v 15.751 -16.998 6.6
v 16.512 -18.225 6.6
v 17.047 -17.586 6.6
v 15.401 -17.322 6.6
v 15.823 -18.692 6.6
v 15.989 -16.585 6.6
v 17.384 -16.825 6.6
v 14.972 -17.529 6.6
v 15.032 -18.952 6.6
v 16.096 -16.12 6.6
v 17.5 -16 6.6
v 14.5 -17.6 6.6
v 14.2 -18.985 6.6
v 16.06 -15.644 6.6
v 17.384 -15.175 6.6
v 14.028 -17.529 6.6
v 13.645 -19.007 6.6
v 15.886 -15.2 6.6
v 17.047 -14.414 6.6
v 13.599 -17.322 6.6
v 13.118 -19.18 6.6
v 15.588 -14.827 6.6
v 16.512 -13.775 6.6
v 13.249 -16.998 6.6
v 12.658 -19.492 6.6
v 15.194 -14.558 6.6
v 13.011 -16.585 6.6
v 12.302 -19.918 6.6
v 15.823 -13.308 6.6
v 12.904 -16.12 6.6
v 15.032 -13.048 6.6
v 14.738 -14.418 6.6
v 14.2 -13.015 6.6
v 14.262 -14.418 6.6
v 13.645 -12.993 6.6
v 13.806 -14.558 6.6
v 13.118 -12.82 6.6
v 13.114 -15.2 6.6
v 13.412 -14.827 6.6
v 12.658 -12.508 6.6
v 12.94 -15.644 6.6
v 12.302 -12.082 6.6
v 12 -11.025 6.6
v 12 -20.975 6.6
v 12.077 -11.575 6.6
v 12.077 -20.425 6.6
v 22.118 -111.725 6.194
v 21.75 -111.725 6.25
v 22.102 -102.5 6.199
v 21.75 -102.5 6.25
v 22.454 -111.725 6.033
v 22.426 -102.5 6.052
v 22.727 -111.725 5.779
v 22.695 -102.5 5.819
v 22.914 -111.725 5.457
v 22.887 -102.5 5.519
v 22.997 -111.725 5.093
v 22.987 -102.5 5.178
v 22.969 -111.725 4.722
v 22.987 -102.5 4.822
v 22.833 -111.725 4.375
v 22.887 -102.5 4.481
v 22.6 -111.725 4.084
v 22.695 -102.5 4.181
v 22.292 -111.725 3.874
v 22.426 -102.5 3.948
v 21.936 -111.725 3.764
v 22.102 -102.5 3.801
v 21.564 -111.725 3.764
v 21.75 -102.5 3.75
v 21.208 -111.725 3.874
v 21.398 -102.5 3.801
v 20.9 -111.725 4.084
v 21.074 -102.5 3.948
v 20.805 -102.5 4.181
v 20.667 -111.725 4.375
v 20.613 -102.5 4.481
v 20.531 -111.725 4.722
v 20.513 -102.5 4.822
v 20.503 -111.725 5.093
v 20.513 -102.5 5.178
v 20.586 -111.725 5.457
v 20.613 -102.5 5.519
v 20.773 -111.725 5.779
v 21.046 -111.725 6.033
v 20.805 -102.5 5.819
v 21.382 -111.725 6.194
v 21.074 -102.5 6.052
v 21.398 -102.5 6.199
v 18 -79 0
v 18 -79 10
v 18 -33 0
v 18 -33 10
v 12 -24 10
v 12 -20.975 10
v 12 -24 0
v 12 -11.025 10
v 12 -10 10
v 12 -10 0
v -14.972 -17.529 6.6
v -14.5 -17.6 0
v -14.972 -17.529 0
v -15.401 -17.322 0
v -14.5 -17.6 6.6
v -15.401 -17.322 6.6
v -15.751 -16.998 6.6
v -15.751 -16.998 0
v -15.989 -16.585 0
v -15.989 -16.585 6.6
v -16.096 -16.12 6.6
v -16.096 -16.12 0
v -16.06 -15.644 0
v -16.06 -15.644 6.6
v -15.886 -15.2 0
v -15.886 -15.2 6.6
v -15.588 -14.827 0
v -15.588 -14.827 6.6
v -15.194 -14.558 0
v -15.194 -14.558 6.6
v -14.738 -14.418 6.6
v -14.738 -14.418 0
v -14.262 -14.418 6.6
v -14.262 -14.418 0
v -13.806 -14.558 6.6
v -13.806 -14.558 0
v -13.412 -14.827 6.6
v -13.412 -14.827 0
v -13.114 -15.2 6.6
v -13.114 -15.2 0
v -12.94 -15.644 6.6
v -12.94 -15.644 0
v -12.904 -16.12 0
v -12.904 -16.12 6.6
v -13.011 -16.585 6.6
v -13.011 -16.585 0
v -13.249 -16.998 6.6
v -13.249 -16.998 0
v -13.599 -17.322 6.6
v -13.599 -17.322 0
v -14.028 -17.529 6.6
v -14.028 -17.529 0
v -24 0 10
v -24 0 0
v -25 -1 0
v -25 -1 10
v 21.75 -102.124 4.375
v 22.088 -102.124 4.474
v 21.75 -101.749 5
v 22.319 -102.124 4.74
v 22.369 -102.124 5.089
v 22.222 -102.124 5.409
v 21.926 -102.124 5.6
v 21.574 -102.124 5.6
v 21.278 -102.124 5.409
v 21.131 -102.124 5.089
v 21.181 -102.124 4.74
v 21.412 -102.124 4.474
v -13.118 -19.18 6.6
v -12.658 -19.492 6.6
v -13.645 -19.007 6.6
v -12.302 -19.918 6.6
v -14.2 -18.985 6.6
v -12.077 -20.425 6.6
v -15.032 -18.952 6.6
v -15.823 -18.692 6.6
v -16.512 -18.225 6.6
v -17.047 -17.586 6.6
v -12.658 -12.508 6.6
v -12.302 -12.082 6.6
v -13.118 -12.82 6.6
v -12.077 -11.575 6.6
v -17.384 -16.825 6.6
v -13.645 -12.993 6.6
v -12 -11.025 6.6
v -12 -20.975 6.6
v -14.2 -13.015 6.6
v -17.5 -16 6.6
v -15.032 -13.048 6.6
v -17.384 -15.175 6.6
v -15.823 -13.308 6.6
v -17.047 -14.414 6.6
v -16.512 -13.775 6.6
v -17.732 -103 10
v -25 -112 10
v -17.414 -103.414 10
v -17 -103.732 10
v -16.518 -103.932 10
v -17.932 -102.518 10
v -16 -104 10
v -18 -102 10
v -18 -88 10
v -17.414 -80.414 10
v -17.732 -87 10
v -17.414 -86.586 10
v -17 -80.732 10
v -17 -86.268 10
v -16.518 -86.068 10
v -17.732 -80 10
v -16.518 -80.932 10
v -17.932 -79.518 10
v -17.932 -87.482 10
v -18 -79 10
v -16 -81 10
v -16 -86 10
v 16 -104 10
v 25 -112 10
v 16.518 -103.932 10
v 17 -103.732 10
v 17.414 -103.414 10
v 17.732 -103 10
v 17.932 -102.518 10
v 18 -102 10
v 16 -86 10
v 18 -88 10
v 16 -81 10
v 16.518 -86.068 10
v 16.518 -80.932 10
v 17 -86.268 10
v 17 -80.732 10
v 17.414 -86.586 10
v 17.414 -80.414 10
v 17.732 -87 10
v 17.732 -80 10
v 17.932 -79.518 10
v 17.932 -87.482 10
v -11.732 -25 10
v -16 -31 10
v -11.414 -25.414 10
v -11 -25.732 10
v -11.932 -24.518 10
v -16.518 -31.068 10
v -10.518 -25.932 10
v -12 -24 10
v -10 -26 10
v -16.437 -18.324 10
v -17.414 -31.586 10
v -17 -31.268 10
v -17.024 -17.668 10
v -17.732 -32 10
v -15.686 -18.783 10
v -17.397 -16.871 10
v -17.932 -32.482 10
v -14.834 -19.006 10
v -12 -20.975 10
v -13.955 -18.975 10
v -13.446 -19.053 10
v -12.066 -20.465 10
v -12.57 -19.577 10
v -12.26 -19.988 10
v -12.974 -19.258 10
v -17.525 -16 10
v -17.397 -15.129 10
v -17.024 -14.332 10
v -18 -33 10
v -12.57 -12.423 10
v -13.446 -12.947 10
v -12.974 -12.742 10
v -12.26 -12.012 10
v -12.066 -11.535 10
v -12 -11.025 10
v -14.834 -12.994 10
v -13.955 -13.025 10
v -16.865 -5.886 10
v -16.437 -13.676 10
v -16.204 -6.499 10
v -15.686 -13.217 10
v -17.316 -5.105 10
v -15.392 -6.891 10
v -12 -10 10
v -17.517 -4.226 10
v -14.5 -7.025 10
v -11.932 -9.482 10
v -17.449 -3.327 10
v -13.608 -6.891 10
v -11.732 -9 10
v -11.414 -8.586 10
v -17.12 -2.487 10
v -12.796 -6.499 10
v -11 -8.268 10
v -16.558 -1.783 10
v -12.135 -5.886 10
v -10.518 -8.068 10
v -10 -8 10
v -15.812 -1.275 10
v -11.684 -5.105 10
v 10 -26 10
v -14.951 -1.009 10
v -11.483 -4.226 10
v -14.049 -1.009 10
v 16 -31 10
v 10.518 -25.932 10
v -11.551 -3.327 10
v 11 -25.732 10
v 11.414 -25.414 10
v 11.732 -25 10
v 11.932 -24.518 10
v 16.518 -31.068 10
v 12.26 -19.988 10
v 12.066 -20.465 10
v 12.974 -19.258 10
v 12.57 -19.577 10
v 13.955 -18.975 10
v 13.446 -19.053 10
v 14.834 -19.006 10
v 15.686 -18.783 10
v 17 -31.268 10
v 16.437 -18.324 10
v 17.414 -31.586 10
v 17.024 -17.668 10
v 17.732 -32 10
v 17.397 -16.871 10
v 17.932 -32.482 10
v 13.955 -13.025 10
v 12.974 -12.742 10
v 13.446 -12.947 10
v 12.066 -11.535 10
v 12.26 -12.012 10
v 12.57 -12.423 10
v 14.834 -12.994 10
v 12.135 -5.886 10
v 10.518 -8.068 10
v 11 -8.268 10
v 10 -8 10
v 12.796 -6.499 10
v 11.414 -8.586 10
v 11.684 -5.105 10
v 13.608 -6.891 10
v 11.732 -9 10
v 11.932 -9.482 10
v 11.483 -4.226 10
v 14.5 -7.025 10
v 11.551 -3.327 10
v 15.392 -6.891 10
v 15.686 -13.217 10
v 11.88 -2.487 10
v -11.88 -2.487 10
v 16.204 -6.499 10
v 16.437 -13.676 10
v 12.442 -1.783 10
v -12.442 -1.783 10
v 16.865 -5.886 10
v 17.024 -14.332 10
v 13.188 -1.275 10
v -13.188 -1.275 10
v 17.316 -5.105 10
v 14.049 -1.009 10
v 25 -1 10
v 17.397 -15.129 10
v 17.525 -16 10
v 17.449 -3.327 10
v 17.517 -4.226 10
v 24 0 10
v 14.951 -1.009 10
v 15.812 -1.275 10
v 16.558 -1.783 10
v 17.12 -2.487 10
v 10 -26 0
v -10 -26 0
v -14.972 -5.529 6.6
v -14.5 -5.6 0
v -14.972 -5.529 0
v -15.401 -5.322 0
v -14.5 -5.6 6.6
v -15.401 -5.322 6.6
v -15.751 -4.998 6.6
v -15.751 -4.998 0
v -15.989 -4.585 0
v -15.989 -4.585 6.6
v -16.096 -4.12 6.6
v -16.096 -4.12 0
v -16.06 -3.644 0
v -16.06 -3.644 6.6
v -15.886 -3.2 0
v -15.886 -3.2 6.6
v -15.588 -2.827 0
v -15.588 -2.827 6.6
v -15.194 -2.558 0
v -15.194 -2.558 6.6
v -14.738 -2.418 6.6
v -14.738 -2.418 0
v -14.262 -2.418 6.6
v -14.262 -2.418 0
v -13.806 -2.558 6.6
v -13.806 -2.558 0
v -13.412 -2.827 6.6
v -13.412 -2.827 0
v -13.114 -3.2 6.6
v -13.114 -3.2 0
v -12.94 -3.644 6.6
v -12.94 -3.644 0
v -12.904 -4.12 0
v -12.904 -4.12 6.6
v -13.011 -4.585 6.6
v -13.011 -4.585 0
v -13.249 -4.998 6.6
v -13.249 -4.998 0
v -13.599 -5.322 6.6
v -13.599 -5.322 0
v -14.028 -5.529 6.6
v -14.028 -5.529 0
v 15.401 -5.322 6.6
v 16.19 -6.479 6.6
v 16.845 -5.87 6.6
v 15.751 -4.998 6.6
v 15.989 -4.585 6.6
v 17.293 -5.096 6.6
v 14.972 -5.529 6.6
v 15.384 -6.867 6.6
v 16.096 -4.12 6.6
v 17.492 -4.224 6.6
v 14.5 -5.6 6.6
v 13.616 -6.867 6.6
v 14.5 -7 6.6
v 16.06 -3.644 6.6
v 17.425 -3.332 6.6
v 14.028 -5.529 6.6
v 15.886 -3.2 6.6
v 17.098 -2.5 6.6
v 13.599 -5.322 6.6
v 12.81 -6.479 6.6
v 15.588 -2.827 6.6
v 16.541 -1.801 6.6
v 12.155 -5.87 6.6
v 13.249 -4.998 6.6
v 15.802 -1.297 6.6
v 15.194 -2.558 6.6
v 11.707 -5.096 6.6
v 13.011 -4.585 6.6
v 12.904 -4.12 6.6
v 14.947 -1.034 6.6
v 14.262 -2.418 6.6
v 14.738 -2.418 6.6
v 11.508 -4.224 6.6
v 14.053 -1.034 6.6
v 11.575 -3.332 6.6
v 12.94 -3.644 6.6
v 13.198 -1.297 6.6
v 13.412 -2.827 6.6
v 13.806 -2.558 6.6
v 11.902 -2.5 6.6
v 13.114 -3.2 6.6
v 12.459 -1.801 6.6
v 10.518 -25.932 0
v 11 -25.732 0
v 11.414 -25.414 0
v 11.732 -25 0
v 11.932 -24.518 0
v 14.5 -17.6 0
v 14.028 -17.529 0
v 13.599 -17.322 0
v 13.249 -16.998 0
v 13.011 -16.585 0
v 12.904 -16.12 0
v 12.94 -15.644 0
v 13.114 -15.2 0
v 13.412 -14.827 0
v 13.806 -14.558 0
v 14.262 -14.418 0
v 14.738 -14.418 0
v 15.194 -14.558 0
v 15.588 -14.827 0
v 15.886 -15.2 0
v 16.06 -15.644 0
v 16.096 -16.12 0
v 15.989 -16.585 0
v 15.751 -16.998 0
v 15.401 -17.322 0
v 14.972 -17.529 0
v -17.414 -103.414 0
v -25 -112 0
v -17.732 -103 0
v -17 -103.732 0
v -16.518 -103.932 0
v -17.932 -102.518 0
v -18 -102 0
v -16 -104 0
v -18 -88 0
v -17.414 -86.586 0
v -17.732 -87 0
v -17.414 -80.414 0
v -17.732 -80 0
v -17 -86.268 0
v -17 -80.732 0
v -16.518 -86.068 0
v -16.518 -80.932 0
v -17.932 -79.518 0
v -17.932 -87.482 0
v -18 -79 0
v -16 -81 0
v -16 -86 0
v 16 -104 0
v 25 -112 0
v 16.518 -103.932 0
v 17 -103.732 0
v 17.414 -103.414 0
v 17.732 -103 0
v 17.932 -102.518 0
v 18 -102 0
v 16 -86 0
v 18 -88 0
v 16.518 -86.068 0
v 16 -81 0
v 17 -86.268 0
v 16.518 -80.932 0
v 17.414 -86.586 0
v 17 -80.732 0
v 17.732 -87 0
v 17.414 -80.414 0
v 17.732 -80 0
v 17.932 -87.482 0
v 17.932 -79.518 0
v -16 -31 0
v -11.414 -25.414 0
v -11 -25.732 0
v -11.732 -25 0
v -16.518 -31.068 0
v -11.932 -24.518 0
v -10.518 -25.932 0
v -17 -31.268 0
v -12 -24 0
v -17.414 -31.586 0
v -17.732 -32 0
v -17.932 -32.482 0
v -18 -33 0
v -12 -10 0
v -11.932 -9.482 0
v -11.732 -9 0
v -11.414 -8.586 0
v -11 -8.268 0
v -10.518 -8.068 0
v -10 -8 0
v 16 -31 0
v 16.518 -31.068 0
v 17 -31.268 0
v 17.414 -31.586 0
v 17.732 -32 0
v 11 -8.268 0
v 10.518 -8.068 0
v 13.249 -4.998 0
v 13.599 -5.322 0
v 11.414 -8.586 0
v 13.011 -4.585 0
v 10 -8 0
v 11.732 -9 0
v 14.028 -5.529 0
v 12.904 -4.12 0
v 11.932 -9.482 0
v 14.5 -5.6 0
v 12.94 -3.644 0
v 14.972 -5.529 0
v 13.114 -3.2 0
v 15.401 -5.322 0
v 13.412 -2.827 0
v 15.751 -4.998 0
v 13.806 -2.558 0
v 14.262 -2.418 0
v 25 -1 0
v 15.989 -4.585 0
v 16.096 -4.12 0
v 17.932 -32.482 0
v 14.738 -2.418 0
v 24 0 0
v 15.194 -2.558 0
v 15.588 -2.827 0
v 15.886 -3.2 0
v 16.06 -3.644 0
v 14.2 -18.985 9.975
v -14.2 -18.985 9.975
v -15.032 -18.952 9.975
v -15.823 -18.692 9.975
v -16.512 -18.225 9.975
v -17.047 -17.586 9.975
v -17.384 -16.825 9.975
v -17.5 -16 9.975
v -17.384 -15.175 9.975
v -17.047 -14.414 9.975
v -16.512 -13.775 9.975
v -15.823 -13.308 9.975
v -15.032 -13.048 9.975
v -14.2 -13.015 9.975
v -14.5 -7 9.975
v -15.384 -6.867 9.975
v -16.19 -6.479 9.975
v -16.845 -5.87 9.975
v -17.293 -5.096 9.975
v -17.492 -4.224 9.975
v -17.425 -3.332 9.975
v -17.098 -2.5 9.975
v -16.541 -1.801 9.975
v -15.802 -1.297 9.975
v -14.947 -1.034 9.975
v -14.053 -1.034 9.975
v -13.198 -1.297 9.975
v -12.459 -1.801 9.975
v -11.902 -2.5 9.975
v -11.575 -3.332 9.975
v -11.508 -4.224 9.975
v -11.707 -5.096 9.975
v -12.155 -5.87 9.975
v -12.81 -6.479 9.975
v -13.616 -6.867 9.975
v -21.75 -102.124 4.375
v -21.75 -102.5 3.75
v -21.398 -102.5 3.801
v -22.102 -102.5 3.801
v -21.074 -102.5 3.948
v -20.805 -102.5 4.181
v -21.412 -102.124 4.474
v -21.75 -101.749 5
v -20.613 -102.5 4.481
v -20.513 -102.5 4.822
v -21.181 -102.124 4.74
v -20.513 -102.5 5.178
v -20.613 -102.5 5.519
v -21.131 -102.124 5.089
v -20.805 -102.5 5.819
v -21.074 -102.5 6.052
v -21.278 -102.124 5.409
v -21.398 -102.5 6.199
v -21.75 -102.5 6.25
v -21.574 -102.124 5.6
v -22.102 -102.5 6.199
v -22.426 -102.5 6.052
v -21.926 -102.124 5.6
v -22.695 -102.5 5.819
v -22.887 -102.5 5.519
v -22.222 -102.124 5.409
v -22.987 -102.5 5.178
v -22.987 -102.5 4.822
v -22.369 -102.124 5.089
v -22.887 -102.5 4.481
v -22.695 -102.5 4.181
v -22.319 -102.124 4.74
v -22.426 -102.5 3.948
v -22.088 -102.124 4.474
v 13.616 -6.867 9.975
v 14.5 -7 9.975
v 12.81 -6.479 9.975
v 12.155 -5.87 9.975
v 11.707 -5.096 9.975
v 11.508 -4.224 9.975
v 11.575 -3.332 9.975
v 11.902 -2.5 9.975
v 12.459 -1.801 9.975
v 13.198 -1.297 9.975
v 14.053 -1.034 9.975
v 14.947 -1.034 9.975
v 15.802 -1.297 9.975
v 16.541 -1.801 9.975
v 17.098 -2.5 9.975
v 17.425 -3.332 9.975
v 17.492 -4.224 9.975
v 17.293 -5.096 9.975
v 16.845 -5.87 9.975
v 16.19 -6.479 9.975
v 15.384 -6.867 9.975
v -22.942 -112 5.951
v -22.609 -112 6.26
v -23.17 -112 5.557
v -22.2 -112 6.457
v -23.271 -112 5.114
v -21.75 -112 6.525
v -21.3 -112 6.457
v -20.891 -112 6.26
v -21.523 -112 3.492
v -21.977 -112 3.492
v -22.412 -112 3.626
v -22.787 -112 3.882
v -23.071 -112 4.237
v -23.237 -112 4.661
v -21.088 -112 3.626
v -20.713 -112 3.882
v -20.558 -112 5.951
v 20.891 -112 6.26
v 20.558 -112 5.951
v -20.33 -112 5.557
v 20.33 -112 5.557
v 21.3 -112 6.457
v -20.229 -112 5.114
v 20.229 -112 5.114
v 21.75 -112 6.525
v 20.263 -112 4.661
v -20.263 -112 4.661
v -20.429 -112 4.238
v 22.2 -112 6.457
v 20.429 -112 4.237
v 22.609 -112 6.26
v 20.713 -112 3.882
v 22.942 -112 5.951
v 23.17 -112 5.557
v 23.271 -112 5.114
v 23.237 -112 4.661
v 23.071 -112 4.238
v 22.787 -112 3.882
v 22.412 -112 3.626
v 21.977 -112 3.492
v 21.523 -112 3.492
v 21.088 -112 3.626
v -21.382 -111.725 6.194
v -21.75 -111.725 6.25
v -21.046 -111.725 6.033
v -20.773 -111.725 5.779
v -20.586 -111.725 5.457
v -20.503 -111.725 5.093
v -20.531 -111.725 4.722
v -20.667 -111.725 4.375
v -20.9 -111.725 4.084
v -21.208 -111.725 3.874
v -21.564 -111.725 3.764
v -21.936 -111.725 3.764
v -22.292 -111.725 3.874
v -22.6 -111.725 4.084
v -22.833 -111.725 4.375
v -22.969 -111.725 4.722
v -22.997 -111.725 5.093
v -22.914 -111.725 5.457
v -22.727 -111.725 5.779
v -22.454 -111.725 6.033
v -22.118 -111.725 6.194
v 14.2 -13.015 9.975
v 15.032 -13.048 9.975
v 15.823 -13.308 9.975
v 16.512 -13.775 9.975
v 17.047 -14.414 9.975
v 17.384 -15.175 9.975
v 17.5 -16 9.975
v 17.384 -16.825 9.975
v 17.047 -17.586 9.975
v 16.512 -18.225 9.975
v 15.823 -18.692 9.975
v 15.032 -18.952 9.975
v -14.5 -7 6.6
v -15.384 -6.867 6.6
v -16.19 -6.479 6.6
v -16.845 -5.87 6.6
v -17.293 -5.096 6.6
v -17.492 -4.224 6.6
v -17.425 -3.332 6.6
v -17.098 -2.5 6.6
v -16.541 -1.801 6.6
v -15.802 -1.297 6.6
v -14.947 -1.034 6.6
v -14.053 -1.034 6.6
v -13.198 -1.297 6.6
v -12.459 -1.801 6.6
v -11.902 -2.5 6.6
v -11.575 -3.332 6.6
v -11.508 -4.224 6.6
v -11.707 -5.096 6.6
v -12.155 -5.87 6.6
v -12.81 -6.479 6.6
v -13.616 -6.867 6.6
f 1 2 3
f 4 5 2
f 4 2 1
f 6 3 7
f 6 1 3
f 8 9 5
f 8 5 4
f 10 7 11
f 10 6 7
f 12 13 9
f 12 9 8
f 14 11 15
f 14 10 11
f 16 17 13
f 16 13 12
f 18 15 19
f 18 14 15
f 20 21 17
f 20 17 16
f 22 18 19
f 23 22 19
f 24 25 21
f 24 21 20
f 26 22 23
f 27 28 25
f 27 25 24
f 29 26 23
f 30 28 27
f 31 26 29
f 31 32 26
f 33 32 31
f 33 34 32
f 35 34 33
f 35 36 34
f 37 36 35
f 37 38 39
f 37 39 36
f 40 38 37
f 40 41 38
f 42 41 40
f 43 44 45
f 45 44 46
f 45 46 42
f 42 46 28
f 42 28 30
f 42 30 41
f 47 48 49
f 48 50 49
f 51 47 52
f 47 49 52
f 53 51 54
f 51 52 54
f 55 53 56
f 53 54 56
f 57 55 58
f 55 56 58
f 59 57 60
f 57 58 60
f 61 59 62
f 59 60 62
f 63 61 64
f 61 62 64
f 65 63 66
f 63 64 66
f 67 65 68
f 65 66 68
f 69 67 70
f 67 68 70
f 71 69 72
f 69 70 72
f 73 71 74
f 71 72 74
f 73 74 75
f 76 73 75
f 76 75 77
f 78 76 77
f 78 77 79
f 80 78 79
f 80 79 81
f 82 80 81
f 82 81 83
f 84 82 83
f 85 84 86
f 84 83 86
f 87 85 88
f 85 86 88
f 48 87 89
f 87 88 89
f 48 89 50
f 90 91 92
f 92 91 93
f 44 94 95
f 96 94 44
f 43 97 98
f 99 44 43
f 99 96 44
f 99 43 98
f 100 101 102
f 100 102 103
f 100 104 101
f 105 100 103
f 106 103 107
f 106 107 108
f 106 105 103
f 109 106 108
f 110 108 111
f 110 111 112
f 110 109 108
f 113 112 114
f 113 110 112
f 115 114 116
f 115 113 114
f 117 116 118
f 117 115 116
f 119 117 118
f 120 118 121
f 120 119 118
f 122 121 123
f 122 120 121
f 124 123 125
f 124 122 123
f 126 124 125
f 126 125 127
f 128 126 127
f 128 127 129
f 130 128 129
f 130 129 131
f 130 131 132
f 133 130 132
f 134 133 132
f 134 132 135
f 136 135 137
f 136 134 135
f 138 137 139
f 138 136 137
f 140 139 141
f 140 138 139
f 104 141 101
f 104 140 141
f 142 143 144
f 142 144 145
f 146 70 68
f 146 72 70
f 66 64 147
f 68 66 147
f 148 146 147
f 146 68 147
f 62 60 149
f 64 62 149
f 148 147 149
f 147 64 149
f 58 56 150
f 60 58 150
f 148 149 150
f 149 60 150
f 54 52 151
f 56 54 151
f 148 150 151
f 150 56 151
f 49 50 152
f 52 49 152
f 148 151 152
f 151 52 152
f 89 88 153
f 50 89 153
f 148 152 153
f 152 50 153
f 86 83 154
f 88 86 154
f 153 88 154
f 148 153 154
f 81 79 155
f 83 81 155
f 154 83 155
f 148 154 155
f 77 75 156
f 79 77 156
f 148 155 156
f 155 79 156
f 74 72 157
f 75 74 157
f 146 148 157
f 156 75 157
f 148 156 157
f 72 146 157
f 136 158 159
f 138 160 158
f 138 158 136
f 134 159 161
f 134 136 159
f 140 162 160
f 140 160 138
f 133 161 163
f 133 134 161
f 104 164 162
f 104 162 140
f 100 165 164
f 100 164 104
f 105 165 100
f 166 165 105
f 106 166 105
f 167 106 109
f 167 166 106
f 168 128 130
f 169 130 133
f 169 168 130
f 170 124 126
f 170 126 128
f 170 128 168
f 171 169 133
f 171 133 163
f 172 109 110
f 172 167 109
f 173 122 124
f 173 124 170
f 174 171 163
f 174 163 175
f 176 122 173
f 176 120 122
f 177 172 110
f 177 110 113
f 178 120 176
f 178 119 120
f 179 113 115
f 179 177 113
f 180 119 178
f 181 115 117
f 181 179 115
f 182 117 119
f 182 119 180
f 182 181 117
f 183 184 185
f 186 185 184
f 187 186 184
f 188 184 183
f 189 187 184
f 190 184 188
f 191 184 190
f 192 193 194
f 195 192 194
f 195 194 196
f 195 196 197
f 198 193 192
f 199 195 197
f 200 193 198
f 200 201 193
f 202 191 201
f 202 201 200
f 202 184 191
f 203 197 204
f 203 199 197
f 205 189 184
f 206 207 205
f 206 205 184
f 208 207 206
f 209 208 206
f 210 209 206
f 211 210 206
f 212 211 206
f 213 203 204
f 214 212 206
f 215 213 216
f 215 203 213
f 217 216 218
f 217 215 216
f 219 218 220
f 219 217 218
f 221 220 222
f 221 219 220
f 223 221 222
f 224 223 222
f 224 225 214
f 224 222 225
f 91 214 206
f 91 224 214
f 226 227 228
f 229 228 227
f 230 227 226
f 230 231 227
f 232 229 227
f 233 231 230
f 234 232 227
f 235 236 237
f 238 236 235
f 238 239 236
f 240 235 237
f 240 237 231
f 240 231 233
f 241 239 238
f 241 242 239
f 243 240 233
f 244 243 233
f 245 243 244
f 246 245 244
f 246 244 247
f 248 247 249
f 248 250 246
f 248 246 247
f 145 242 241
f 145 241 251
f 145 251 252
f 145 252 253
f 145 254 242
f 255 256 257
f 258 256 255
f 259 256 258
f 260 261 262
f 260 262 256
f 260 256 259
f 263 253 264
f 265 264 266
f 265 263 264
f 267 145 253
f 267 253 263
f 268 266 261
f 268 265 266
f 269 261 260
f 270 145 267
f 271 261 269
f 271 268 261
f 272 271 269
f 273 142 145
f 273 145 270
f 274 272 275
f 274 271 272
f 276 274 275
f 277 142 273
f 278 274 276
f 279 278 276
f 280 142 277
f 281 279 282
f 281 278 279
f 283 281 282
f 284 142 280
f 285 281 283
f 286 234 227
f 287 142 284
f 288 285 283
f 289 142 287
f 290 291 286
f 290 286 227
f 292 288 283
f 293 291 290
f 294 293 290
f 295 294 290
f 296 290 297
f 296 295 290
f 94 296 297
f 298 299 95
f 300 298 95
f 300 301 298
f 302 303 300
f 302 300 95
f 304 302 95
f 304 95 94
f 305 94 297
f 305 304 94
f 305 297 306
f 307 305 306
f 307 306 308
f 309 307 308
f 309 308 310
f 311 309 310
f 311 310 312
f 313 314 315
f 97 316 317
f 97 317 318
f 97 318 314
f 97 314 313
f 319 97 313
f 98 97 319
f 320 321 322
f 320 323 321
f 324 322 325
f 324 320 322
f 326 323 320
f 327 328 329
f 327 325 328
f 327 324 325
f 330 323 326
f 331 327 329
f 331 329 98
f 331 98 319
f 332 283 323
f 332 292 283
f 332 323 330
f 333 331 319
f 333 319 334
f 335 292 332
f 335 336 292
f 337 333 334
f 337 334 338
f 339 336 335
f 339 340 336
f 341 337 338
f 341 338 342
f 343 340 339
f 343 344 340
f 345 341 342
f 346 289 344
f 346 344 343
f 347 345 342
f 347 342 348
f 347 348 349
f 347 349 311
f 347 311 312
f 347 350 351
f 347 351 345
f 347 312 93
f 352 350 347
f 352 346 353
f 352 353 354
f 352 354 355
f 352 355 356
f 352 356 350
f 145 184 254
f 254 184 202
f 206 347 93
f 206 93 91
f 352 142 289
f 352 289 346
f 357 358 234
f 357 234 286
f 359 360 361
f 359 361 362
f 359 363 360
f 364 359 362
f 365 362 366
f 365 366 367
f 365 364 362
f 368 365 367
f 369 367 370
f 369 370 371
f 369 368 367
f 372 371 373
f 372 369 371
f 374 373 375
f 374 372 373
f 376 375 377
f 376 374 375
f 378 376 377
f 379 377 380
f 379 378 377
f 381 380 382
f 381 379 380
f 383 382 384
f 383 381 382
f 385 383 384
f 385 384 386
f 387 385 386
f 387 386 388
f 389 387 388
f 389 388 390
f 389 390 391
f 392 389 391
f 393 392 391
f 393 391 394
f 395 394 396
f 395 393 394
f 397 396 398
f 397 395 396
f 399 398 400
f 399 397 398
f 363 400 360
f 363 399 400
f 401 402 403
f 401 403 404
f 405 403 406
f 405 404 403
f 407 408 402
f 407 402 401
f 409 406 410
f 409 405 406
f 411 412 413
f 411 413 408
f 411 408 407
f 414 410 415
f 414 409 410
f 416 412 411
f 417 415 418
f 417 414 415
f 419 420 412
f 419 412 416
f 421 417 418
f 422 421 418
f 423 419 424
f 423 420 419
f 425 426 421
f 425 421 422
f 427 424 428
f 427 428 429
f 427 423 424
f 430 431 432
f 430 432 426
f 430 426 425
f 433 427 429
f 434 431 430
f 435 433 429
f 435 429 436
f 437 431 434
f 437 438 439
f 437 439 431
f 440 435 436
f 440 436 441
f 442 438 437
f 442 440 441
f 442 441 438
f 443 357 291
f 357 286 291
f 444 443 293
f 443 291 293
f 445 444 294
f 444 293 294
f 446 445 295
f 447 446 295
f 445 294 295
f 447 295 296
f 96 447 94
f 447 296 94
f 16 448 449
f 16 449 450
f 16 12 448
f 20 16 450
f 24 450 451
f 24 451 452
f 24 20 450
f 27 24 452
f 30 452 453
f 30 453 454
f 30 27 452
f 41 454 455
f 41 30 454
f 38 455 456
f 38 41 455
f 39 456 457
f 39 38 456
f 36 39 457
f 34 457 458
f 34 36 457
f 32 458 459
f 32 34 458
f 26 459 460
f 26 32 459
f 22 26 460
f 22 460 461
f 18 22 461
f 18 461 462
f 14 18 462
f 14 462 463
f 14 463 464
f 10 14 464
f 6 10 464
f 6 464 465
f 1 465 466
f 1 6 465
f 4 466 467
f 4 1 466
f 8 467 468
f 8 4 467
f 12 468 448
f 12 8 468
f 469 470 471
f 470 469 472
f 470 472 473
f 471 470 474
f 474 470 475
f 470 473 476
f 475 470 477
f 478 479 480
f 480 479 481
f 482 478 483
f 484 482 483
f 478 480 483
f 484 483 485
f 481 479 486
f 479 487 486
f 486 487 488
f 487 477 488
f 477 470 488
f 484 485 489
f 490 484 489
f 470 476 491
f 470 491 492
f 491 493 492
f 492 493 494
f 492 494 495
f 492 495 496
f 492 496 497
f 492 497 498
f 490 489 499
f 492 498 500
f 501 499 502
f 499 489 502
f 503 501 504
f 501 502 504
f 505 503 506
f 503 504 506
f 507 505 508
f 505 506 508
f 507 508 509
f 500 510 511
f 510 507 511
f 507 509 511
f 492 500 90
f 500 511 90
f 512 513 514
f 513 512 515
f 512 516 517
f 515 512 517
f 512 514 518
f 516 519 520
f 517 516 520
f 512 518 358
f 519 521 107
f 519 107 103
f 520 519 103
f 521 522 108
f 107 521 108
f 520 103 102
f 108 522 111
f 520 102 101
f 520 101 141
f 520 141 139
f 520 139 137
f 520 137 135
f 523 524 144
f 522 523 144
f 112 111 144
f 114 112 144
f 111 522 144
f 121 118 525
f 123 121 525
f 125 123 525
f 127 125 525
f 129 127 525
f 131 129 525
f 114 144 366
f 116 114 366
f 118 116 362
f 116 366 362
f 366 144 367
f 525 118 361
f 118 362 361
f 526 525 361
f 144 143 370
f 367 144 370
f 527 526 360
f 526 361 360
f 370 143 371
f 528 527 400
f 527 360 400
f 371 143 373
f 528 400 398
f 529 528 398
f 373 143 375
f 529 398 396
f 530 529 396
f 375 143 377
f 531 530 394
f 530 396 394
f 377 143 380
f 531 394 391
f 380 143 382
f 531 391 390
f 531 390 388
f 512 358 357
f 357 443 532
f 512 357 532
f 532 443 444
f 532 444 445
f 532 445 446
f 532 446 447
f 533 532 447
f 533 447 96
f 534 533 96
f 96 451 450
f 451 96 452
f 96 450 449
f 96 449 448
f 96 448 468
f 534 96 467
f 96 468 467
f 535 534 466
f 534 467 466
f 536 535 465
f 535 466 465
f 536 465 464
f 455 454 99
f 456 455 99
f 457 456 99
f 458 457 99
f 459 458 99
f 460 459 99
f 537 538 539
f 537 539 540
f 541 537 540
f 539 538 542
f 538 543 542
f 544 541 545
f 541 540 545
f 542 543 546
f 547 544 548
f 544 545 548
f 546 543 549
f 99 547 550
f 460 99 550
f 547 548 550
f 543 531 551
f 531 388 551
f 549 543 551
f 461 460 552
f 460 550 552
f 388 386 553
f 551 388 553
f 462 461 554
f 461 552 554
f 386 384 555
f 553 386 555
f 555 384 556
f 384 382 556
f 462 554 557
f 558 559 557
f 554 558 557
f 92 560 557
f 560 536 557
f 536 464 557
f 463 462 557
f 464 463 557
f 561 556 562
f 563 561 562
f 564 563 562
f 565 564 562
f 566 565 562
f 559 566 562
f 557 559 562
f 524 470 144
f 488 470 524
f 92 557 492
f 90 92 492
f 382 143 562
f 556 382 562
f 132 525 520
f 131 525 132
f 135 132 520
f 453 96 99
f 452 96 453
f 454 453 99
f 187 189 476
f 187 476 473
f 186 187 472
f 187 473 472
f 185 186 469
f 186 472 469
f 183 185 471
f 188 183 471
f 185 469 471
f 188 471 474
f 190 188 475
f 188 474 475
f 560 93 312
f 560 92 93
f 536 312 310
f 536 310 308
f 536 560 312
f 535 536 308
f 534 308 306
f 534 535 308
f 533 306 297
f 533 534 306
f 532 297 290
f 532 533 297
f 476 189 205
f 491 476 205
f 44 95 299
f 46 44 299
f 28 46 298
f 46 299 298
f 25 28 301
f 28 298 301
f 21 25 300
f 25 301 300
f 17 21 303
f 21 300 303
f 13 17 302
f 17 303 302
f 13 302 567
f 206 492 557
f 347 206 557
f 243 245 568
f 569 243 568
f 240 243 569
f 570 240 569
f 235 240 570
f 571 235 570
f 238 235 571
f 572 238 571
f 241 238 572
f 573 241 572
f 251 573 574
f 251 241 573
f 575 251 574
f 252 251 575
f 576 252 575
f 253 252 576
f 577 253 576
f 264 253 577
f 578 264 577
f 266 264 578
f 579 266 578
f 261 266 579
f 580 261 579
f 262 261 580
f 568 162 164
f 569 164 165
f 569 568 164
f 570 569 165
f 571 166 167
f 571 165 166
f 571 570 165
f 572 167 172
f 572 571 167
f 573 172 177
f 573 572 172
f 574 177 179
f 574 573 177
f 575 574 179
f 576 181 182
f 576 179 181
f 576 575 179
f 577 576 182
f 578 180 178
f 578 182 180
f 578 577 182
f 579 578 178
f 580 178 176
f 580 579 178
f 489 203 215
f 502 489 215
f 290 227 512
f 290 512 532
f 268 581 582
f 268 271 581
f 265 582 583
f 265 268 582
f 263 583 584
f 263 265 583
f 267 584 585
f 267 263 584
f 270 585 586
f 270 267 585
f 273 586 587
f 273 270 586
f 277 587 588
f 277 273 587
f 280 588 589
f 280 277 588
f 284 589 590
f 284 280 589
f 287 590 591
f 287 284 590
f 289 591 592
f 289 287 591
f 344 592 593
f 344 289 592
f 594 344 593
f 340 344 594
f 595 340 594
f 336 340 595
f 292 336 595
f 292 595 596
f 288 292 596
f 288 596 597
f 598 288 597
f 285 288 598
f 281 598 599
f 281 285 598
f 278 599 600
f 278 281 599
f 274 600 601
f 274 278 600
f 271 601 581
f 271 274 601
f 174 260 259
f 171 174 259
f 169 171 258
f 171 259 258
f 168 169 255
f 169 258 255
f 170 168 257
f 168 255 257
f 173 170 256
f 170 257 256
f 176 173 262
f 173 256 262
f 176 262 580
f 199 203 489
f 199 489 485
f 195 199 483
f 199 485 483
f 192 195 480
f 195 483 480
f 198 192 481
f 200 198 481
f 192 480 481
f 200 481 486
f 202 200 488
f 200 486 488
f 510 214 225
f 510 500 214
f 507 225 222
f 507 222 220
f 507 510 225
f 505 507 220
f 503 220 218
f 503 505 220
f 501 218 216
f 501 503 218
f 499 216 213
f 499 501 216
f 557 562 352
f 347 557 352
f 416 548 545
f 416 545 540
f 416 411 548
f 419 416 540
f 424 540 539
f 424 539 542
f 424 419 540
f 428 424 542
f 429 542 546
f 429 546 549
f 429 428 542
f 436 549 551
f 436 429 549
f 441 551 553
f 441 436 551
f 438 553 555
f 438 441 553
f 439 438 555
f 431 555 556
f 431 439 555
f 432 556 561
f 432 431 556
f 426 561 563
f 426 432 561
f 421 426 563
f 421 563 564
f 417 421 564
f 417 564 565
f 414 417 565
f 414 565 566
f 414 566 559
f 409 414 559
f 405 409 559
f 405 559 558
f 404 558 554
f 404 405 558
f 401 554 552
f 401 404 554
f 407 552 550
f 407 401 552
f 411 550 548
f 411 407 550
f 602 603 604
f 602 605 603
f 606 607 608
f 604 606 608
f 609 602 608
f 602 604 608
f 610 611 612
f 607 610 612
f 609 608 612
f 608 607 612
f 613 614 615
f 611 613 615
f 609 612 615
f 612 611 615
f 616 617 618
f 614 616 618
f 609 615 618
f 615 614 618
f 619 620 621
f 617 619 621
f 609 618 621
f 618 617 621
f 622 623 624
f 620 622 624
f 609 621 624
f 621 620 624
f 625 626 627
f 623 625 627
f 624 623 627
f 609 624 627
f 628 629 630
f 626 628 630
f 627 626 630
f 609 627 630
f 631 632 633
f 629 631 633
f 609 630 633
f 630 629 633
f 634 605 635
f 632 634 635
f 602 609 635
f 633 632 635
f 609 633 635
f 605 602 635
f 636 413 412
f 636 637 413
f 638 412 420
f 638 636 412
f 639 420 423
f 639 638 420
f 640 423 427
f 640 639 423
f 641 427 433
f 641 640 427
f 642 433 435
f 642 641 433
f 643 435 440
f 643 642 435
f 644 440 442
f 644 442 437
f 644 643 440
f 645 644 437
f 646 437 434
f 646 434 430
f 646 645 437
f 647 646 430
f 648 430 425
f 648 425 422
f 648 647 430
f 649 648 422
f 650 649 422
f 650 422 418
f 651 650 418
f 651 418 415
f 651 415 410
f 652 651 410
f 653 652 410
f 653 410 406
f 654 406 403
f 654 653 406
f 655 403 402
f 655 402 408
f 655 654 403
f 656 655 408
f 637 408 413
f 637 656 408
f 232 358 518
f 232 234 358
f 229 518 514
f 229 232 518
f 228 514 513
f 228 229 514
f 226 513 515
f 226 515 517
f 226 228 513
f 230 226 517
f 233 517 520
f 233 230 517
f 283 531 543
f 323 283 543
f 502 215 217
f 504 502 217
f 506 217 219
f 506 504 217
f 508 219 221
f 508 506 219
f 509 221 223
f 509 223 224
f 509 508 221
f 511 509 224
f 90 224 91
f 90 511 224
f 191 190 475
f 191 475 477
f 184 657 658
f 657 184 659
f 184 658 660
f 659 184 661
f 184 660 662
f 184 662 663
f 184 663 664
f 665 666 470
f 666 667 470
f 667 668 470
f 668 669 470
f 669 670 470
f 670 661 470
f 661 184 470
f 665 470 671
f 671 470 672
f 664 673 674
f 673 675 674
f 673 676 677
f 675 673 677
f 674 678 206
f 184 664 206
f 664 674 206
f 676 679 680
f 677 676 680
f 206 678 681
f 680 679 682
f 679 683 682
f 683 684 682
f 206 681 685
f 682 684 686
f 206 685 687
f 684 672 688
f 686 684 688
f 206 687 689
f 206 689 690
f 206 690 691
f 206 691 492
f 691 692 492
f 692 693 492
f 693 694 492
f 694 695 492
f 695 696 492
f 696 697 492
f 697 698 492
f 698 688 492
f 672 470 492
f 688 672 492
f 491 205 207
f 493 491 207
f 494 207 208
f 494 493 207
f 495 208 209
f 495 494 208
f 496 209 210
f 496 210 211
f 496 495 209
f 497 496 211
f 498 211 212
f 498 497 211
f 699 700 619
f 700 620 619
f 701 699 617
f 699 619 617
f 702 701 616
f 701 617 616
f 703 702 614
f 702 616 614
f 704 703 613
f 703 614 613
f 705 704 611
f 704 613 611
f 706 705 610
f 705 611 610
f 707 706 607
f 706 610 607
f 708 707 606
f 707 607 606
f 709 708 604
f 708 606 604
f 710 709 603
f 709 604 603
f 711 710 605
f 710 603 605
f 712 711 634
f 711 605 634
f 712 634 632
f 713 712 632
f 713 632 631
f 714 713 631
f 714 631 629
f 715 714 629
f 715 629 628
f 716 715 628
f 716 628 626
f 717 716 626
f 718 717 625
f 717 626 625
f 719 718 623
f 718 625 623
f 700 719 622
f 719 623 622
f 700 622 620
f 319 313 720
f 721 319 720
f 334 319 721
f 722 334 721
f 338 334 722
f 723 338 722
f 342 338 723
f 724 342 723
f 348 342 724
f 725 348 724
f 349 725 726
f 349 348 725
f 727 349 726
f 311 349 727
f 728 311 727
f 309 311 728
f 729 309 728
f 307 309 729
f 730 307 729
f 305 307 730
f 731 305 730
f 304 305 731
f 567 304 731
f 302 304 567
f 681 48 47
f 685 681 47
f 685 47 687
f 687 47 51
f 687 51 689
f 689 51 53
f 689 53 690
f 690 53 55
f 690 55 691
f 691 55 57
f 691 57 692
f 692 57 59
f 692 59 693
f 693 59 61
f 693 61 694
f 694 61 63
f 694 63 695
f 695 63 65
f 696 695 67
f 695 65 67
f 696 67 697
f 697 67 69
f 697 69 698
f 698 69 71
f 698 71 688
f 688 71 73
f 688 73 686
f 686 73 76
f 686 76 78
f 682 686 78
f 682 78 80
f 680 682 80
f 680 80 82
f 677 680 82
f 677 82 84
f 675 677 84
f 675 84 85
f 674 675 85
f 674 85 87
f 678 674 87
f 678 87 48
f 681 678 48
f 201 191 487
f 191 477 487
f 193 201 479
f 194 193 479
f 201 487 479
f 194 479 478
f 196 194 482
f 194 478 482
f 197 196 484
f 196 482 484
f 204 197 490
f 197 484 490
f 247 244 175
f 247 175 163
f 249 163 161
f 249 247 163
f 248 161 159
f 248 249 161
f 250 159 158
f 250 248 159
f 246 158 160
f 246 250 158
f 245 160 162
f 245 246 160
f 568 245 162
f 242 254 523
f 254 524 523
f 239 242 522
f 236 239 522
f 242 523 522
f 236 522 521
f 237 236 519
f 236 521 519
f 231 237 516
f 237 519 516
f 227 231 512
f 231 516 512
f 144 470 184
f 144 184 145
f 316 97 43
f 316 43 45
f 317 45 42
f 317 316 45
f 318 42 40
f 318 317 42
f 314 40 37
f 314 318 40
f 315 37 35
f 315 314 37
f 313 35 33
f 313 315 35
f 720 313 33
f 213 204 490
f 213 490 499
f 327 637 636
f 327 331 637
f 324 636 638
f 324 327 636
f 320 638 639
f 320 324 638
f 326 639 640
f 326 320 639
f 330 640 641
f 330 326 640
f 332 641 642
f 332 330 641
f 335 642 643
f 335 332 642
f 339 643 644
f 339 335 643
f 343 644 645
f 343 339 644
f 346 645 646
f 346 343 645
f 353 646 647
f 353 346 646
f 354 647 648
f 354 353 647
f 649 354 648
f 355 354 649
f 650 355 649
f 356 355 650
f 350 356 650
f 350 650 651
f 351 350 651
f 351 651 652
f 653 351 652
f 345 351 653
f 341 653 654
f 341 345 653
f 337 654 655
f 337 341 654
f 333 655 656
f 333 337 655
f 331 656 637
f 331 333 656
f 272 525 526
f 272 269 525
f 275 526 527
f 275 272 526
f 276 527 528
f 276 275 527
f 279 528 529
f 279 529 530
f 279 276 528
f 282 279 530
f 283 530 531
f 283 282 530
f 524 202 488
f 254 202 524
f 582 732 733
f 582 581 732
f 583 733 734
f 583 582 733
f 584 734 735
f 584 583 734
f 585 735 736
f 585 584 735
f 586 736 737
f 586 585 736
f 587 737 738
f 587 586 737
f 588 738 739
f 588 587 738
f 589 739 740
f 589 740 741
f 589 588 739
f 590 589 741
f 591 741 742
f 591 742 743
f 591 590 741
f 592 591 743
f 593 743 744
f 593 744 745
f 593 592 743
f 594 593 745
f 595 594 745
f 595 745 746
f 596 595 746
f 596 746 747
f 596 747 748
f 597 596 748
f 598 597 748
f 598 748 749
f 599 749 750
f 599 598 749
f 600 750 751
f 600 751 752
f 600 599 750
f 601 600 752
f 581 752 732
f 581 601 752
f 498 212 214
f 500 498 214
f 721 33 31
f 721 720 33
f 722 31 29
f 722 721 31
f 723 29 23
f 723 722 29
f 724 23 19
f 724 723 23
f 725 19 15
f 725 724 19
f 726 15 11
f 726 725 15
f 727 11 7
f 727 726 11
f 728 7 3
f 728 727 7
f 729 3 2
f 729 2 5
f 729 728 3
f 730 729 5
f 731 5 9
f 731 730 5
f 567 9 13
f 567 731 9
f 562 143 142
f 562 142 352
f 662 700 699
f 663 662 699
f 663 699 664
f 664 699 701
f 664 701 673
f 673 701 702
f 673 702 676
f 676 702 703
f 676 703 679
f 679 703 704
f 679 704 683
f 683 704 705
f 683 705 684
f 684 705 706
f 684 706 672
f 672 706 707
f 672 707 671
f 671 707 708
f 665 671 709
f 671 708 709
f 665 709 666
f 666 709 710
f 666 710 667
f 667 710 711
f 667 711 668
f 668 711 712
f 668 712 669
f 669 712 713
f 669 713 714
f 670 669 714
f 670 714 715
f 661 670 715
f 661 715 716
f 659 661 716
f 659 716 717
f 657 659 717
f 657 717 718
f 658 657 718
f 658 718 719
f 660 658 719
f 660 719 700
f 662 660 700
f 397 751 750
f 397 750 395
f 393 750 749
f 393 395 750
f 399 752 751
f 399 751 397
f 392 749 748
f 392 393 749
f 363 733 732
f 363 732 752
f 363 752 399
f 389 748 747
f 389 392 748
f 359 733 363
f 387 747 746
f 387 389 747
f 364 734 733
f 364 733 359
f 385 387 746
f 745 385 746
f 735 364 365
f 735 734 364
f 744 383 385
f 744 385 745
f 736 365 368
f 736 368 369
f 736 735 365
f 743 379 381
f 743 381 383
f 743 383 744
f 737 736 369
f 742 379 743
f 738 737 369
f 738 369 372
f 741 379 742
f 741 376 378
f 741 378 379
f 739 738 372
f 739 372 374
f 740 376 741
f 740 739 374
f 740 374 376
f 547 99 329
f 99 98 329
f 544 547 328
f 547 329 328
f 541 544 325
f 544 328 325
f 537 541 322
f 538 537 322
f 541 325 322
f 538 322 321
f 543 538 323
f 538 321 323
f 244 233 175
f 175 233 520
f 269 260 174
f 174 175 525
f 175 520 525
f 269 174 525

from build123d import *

# Parameters (mm, degrees)
SKETCH1_W                                    = 50
SKETCH1_H                                    = 112
SKETCH1_W_2                                  = 24
SKETCH1_H_2                                  = 18
BOSS_EXTRUDE1_DEPTH                          = 10
SKETCH8_W                                    = 36
SKETCH8_H                                    = 50
SKETCH8_H_2                                  = 18
CUT_EXTRUDE1_DEPTH                           = 116.191145493
CBORE_FOR_M3_HEXAGON_SOCKET_HEAD_CAP_2_COUNT = 2
CBORE_FOR_M3_HEXAGON_SOCKET_HEAD_CAP_2_PITCH = 12
CBORE_FOR_M3_HEXAGON_SOCKET_HEAD_CAP_3_COUNT = 2
CBORE_FOR_M3_HEXAGON_SOCKET_HEAD_CAP_3_PITCH = 29
CBORE_FOR_M3_HEXAGON_SOCKET_HEAD_CAP_4_COUNT = 2
CBORE_FOR_M3_HEXAGON_SOCKET_HEAD_CAP_4_PITCH = 31.384709653
CHAMFER1_SIZE                                = 1
FILLET1_R                                    = 2
M3_TAPPED_HOLE1_D                            = 2.5
M3_TAPPED_HOLE1_DEPTH                        = 9.5
M3_TAPPED_HOLE1_CSINK_D                      = 3.05
M3_TAPPED_HOLE1_CSINK_ANGLE                  = 90
M3_TAPPED_HOLE1_TIP                          = 0.751075774


with BuildPart() as part:
    # Sketch1 → Boss-Extrude1 (new body)
    with BuildSketch(Plane.XY):
        with Locations((0, -56)):
            Rectangle(SKETCH1_W, SKETCH1_H)
        with Locations((0, -17)):
            Rectangle(SKETCH1_W_2, SKETCH1_H_2, mode=Mode.SUBTRACT)
    extrude(amount=BOSS_EXTRUDE1_DEPTH)

    # Sketch8 → Cut-Extrude1 (cut, through all)
    with BuildSketch(Plane.XY.offset(10)):
        with Locations((0, -56)):
            Rectangle(SKETCH8_W, SKETCH8_H)
        with Locations((0, -95)):
            Rectangle(SKETCH8_W, SKETCH8_H_2)
    extrude(amount=-CUT_EXTRUDE1_DEPTH, mode=Mode.SUBTRACT)

    # Sketch7 → CBORE for M3 Hexagon socket head cap screws3 (revolve, cut)
    with BuildSketch(Plane(origin=(-14.5, -4, 10), x_dir=(0, -1, 0), z_dir=(1, 0, 0))):
        Polygon((0, 0), (0, 10), (1.6, 10), (1.6, 3.4), (3, 3.4), (3, 0.025), (3.025, 0), align=None)
    cbore_for_m3_hexagon_socket_head_cap_scr = revolve(axis=Axis((-14.5, -4, 16.35), (0, 0, -1)), mode=Mode.SUBTRACT)

    # CBORE for M3 Hexagon socket head cap 2: CBORE for M3 Hexagon socket head cap screws3 ×2
    with Locations(*[(0, -i * CBORE_FOR_M3_HEXAGON_SOCKET_HEAD_CAP_2_PITCH, 0) for i in range(1, CBORE_FOR_M3_HEXAGON_SOCKET_HEAD_CAP_2_COUNT)]):
        add(cbore_for_m3_hexagon_socket_head_cap_scr, mode=Mode.SUBTRACT)

    # CBORE for M3 Hexagon socket head cap 3: CBORE for M3 Hexagon socket head cap screws3 ×2
    with Locations(*[(i * CBORE_FOR_M3_HEXAGON_SOCKET_HEAD_CAP_3_PITCH, 0, 0) for i in range(1, CBORE_FOR_M3_HEXAGON_SOCKET_HEAD_CAP_3_COUNT)]):
        add(cbore_for_m3_hexagon_socket_head_cap_scr, mode=Mode.SUBTRACT)

    # CBORE for M3 Hexagon socket head cap 4: CBORE for M3 Hexagon socket head cap screws3 ×2
    with Locations(*[Vector(0.9240168324218909, -0.38235179272629954, 0) * (i * CBORE_FOR_M3_HEXAGON_SOCKET_HEAD_CAP_4_PITCH) for i in range(1, CBORE_FOR_M3_HEXAGON_SOCKET_HEAD_CAP_4_COUNT)]):
        add(cbore_for_m3_hexagon_socket_head_cap_scr, mode=Mode.SUBTRACT)

    # Chamfer1
    chamfer1_edges = [part.edges().sort_by_distance(p)[0] for p in [
        (-25, 0, 5),
        (25, 0, 5),
    ]]
    chamfer(chamfer1_edges, length=CHAMFER1_SIZE)

    # Fillet1
    fillet1_edges = [part.edges().sort_by_distance(p)[0] for p in [
        (-12, -8, 5),
        (-12, -26, 5),
        (12, -26, 5),
        (12, -8, 5),
        (-12, -14.341687605, 8.2875),
        (-12, -17.658312395, 8.2875),
        (12, -17.658312395, 8.2875),
        (12, -14.341687605, 8.2875),
        (18, -86, 5),
        (18, -104, 5),
        (-18, -104, 5),
        (-18, -86, 5),
        (18, -31, 5),
        (18, -81, 5),
        (-18, -81, 5),
        (-18, -31, 5),
    ]]
    fillet(fillet1_edges, radius=FILLET1_R)

    # M3 Tapped Hole1
    with Locations(Plane(origin=(-21.75, -112, 5), x_dir=(0, 0, -1), z_dir=(0, -1, 0))):
        with Locations((0, 0), (0, 43.5)):
            CounterSinkHole(M3_TAPPED_HOLE1_D / 2, M3_TAPPED_HOLE1_CSINK_D / 2, depth=M3_TAPPED_HOLE1_DEPTH, counter_sink_angle=M3_TAPPED_HOLE1_CSINK_ANGLE)
            with Locations((0, 0, -(M3_TAPPED_HOLE1_DEPTH + M3_TAPPED_HOLE1_TIP / 2))):  # 118° drill point
                Cone(0, M3_TAPPED_HOLE1_D / 2, M3_TAPPED_HOLE1_TIP, mode=Mode.SUBTRACT)


solid = part.part
